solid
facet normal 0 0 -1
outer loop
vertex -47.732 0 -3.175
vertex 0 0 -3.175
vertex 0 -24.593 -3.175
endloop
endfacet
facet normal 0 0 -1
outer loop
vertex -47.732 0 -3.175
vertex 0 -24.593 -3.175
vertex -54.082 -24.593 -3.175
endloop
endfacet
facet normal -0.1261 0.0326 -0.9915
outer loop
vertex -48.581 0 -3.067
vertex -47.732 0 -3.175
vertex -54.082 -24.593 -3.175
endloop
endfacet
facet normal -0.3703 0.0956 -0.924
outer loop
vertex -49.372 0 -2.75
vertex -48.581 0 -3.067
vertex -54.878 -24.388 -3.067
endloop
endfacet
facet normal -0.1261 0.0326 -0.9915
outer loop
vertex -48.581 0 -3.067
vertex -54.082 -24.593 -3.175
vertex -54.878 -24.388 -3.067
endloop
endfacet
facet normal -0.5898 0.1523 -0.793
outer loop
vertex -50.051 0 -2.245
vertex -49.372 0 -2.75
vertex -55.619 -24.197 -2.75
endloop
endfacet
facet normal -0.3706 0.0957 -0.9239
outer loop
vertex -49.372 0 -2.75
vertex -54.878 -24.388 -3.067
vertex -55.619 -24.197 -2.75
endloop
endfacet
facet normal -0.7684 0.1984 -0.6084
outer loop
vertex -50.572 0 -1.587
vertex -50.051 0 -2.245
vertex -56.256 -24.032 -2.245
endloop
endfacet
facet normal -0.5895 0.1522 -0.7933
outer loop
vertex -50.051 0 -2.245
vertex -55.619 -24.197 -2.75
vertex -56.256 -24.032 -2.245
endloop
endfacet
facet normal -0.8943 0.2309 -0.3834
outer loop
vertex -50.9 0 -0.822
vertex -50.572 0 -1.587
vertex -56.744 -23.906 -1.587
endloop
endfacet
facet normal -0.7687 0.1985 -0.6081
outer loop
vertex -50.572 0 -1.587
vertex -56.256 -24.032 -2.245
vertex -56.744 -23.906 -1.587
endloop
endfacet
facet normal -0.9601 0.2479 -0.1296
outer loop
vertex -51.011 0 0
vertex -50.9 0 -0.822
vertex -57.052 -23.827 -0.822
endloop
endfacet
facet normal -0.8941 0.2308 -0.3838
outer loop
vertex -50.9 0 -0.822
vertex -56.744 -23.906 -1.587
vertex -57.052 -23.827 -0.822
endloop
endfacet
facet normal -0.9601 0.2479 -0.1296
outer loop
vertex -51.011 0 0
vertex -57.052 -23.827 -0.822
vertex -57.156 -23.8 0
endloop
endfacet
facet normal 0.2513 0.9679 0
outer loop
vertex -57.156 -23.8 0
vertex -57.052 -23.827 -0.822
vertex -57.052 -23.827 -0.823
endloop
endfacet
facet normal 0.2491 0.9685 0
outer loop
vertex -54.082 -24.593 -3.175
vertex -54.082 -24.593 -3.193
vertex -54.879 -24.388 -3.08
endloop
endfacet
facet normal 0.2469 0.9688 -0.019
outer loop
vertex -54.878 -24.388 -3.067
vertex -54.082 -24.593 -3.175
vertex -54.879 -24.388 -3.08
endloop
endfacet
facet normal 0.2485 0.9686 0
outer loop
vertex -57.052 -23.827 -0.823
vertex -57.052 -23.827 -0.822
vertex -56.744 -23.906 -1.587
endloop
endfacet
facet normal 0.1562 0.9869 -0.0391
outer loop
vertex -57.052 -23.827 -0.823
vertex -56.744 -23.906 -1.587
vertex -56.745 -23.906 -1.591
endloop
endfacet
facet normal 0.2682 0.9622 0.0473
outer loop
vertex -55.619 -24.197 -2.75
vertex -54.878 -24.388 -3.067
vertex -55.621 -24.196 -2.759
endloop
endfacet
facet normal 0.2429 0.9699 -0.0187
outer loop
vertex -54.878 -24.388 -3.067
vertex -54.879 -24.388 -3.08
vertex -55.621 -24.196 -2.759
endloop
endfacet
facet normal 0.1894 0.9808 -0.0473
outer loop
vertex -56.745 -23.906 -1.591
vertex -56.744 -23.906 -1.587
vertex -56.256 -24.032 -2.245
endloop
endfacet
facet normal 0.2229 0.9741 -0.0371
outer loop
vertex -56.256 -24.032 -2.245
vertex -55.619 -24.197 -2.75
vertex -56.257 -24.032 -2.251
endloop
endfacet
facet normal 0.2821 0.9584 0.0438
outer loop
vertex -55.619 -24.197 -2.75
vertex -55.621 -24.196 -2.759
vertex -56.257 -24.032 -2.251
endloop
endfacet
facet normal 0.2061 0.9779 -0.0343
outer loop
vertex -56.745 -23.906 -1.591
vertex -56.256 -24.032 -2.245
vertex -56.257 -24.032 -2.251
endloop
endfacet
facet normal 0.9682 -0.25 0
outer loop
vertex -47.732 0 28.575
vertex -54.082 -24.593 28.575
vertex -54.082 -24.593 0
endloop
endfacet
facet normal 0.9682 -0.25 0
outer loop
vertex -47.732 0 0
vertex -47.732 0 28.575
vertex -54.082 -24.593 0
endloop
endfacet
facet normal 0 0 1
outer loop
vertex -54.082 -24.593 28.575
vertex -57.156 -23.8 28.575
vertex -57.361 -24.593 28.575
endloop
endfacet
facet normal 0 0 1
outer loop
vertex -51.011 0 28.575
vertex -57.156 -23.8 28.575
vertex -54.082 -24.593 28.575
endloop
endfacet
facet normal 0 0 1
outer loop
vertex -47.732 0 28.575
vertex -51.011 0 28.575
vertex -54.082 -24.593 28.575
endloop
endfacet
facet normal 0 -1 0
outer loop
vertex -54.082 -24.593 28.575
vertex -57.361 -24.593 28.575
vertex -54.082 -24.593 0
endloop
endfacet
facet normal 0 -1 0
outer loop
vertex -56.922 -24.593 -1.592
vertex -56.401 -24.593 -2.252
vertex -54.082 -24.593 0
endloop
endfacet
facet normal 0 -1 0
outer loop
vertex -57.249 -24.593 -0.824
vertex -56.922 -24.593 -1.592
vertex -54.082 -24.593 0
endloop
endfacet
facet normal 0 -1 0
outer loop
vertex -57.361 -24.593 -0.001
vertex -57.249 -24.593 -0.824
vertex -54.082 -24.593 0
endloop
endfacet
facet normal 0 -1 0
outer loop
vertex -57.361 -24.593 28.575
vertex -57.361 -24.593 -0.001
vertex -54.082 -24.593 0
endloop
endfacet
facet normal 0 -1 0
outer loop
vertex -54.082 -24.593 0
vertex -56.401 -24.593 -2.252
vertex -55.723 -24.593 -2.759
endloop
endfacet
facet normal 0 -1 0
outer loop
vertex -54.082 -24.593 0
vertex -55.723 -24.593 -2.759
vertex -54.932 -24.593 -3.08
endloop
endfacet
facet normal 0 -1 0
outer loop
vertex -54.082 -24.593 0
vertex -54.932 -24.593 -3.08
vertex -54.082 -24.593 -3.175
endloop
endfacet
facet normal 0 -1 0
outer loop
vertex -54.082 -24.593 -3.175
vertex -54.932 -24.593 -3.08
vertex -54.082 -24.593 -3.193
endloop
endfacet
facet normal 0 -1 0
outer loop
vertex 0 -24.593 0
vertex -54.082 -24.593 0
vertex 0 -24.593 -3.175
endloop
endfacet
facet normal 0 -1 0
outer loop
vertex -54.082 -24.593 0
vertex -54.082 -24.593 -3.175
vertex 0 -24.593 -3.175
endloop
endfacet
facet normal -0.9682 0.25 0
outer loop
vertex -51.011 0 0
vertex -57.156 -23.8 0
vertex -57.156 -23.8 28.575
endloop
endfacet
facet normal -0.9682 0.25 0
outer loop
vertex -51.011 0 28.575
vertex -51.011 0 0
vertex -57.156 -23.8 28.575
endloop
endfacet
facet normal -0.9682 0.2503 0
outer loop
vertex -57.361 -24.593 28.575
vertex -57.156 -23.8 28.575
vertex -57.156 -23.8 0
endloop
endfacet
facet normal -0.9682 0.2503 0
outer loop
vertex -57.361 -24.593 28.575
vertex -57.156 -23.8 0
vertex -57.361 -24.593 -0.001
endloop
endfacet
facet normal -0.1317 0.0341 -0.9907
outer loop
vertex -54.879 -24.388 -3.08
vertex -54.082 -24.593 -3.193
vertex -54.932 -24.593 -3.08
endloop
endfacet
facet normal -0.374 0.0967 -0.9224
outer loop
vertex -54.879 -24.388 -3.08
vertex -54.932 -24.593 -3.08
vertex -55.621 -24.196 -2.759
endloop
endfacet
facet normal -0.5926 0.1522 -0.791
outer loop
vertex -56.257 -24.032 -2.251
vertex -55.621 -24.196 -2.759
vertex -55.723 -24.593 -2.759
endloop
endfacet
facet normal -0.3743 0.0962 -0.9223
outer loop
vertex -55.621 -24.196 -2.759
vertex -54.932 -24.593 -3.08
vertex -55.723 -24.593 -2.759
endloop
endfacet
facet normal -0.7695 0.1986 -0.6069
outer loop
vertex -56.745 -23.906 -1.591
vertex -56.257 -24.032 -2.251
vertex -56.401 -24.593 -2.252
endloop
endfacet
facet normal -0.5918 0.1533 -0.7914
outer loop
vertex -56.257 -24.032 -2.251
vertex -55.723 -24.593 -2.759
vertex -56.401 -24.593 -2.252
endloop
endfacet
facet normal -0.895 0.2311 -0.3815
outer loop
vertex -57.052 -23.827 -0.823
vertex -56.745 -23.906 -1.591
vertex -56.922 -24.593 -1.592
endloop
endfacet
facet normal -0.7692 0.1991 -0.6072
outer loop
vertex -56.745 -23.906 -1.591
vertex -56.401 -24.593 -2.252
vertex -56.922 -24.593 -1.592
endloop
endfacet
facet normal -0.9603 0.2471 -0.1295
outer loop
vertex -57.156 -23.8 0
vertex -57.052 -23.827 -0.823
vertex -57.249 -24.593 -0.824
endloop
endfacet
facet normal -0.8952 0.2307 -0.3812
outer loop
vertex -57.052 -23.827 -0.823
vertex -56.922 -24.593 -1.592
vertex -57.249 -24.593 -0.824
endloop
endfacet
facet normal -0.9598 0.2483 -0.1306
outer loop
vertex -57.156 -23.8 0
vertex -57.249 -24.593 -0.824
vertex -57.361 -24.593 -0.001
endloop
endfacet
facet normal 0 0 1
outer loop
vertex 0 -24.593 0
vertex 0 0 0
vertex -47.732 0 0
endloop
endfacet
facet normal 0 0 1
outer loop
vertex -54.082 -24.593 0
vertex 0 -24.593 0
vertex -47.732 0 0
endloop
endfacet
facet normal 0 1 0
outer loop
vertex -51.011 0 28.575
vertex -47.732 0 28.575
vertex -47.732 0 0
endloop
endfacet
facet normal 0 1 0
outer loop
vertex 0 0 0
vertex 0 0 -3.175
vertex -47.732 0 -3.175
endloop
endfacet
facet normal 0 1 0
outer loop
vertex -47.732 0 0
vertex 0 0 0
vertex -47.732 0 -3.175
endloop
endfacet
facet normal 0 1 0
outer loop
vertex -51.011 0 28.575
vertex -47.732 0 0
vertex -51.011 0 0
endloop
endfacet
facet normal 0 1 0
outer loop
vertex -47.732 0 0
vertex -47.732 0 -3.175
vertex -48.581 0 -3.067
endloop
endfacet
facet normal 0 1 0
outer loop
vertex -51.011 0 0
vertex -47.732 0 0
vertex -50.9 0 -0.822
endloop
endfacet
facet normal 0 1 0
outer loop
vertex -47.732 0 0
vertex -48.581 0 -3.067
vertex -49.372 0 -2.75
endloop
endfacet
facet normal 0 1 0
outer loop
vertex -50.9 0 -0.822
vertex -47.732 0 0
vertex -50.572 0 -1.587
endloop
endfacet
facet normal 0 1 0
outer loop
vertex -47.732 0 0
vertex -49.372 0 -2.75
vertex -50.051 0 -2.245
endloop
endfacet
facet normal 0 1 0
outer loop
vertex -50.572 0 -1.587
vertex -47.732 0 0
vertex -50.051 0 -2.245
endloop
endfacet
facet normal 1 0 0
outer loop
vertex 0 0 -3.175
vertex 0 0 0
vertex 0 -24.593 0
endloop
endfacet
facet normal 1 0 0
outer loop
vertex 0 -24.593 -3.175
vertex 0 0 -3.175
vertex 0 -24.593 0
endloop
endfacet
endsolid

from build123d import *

# Parameters (mm, degrees)
BASE_FLANGE5_DEPTH       = 3.175
EDGE_FLANGE4_START       = -37.332955736
EDGE_FLANGE4_DEPTH       = 25.4
BOSS_EXTRUDE3_DEPTH      = 28.575
BOSS_EXTRUDE3_DEPTH_BACK = 5.08
CUT_EXTRUDE4_DEPTH       = 34.925
CUT_EXTRUDE4_DEPTH_BACK  = 5.588
CUT_EXTRUDE7_DEPTH       = 33.274
CUT_EXTRUDE7_DEPTH_BACK  = 9.779


# Read off the part's stored shape, not the designer's step: Edge-Flange4
# Sheet-metal steps are written as plain solids
with BuildPart() as part:
    # Sketch13 → Base-Flange5 (new body)
    with BuildSketch(Plane.XY):
        Polygon((-47.732145582, 0), (0, 0), (0, -24.593455331), (-54.08210266, -24.593455331), align=None)
    extrude(amount=-BASE_FLANGE5_DEPTH)

    # Edge-Flange4 outline → Edge-Flange4 (add)
    with BuildSketch(Plane(origin=(0, 0, 0), x_dir=(0.9682462728649326, -0.24999831016062188, 0), z_dir=(0.24999831016062188, 0.9682462728649326, 0)).offset(EDGE_FLANGE4_START)):
        with BuildLine():
            Line((-46.216472056, -28.575), (-46.216472056, 3.175))
            ThreePointArc((-46.216472056, 3.175), (-48.461536086, 2.24506403), (-49.391472056, 0))
            Line((-49.391472056, 0), (-49.391472056, -28.575))
            Line((-49.391472056, -28.575), (-46.216472056, -28.575))
        make_face()
    extrude(amount=EDGE_FLANGE4_DEPTH)

    # Sketch50 → Boss-Extrude3 (add, two sides: drawn at the far end of the back side and taken through both)
    with BuildSketch(Plane.XY.offset(-BOSS_EXTRUDE3_DEPTH_BACK)):
        Polygon((-54.08210266, -24.593455331), (-57.156284576, -23.799710696), (-57.361227082, -24.593455331), align=None)
    extrude(amount=BOSS_EXTRUDE3_DEPTH + BOSS_EXTRUDE3_DEPTH_BACK)

    # Sketch51 → Cut-Extrude4 (cut, two sides: drawn at the far end of the back side and taken through both)
    with BuildSketch(Plane.XY.offset(-CUT_EXTRUDE4_DEPTH_BACK)):
        Polygon((-47.732145582, 0), (-51.011270004, 0), (-50.806327498, 0.793744635), align=None)
    extrude(amount=CUT_EXTRUDE4_DEPTH + CUT_EXTRUDE4_DEPTH_BACK, mode=Mode.SUBTRACT)

    # Sketch56 → Cut-Extrude7 (cut, two sides: drawn at the far end of the back side and taken through both)
    with BuildSketch(Plane(origin=(-9.298174, -36.122285036, -0.026223985), x_dir=(0.9684252131455058, -0.24928299754212324, 0.0032547934643607206), z_dir=(0.24928204027092418, 0.9684306738770053, 0.0007030593821182495)).offset(-CUT_EXTRUDE7_DEPTH_BACK)):
        with BuildLine():
            Line((-49.435258201, 4.892901472), (-46.260275882, 4.90323379))
            Line((-46.260275882, 4.90323379), (-46.235347228, 3.016163107))
            ThreePointArc((-46.235347228, 3.016163107), (-48.4905831, 2.0739806), (-49.418723851, -0.187070364))
            Line((-49.418723851, -0.187070364), (-50.079202572, -0.187070364))
            Line((-50.079202572, -0.187070364), (-50.079202572, 4.892901472))
            Line((-50.079202572, 4.892901472), (-49.435258201, 4.892901472))
        make_face()
    extrude(amount=CUT_EXTRUDE7_DEPTH + CUT_EXTRUDE7_DEPTH_BACK, mode=Mode.SUBTRACT)


solid = part.part
